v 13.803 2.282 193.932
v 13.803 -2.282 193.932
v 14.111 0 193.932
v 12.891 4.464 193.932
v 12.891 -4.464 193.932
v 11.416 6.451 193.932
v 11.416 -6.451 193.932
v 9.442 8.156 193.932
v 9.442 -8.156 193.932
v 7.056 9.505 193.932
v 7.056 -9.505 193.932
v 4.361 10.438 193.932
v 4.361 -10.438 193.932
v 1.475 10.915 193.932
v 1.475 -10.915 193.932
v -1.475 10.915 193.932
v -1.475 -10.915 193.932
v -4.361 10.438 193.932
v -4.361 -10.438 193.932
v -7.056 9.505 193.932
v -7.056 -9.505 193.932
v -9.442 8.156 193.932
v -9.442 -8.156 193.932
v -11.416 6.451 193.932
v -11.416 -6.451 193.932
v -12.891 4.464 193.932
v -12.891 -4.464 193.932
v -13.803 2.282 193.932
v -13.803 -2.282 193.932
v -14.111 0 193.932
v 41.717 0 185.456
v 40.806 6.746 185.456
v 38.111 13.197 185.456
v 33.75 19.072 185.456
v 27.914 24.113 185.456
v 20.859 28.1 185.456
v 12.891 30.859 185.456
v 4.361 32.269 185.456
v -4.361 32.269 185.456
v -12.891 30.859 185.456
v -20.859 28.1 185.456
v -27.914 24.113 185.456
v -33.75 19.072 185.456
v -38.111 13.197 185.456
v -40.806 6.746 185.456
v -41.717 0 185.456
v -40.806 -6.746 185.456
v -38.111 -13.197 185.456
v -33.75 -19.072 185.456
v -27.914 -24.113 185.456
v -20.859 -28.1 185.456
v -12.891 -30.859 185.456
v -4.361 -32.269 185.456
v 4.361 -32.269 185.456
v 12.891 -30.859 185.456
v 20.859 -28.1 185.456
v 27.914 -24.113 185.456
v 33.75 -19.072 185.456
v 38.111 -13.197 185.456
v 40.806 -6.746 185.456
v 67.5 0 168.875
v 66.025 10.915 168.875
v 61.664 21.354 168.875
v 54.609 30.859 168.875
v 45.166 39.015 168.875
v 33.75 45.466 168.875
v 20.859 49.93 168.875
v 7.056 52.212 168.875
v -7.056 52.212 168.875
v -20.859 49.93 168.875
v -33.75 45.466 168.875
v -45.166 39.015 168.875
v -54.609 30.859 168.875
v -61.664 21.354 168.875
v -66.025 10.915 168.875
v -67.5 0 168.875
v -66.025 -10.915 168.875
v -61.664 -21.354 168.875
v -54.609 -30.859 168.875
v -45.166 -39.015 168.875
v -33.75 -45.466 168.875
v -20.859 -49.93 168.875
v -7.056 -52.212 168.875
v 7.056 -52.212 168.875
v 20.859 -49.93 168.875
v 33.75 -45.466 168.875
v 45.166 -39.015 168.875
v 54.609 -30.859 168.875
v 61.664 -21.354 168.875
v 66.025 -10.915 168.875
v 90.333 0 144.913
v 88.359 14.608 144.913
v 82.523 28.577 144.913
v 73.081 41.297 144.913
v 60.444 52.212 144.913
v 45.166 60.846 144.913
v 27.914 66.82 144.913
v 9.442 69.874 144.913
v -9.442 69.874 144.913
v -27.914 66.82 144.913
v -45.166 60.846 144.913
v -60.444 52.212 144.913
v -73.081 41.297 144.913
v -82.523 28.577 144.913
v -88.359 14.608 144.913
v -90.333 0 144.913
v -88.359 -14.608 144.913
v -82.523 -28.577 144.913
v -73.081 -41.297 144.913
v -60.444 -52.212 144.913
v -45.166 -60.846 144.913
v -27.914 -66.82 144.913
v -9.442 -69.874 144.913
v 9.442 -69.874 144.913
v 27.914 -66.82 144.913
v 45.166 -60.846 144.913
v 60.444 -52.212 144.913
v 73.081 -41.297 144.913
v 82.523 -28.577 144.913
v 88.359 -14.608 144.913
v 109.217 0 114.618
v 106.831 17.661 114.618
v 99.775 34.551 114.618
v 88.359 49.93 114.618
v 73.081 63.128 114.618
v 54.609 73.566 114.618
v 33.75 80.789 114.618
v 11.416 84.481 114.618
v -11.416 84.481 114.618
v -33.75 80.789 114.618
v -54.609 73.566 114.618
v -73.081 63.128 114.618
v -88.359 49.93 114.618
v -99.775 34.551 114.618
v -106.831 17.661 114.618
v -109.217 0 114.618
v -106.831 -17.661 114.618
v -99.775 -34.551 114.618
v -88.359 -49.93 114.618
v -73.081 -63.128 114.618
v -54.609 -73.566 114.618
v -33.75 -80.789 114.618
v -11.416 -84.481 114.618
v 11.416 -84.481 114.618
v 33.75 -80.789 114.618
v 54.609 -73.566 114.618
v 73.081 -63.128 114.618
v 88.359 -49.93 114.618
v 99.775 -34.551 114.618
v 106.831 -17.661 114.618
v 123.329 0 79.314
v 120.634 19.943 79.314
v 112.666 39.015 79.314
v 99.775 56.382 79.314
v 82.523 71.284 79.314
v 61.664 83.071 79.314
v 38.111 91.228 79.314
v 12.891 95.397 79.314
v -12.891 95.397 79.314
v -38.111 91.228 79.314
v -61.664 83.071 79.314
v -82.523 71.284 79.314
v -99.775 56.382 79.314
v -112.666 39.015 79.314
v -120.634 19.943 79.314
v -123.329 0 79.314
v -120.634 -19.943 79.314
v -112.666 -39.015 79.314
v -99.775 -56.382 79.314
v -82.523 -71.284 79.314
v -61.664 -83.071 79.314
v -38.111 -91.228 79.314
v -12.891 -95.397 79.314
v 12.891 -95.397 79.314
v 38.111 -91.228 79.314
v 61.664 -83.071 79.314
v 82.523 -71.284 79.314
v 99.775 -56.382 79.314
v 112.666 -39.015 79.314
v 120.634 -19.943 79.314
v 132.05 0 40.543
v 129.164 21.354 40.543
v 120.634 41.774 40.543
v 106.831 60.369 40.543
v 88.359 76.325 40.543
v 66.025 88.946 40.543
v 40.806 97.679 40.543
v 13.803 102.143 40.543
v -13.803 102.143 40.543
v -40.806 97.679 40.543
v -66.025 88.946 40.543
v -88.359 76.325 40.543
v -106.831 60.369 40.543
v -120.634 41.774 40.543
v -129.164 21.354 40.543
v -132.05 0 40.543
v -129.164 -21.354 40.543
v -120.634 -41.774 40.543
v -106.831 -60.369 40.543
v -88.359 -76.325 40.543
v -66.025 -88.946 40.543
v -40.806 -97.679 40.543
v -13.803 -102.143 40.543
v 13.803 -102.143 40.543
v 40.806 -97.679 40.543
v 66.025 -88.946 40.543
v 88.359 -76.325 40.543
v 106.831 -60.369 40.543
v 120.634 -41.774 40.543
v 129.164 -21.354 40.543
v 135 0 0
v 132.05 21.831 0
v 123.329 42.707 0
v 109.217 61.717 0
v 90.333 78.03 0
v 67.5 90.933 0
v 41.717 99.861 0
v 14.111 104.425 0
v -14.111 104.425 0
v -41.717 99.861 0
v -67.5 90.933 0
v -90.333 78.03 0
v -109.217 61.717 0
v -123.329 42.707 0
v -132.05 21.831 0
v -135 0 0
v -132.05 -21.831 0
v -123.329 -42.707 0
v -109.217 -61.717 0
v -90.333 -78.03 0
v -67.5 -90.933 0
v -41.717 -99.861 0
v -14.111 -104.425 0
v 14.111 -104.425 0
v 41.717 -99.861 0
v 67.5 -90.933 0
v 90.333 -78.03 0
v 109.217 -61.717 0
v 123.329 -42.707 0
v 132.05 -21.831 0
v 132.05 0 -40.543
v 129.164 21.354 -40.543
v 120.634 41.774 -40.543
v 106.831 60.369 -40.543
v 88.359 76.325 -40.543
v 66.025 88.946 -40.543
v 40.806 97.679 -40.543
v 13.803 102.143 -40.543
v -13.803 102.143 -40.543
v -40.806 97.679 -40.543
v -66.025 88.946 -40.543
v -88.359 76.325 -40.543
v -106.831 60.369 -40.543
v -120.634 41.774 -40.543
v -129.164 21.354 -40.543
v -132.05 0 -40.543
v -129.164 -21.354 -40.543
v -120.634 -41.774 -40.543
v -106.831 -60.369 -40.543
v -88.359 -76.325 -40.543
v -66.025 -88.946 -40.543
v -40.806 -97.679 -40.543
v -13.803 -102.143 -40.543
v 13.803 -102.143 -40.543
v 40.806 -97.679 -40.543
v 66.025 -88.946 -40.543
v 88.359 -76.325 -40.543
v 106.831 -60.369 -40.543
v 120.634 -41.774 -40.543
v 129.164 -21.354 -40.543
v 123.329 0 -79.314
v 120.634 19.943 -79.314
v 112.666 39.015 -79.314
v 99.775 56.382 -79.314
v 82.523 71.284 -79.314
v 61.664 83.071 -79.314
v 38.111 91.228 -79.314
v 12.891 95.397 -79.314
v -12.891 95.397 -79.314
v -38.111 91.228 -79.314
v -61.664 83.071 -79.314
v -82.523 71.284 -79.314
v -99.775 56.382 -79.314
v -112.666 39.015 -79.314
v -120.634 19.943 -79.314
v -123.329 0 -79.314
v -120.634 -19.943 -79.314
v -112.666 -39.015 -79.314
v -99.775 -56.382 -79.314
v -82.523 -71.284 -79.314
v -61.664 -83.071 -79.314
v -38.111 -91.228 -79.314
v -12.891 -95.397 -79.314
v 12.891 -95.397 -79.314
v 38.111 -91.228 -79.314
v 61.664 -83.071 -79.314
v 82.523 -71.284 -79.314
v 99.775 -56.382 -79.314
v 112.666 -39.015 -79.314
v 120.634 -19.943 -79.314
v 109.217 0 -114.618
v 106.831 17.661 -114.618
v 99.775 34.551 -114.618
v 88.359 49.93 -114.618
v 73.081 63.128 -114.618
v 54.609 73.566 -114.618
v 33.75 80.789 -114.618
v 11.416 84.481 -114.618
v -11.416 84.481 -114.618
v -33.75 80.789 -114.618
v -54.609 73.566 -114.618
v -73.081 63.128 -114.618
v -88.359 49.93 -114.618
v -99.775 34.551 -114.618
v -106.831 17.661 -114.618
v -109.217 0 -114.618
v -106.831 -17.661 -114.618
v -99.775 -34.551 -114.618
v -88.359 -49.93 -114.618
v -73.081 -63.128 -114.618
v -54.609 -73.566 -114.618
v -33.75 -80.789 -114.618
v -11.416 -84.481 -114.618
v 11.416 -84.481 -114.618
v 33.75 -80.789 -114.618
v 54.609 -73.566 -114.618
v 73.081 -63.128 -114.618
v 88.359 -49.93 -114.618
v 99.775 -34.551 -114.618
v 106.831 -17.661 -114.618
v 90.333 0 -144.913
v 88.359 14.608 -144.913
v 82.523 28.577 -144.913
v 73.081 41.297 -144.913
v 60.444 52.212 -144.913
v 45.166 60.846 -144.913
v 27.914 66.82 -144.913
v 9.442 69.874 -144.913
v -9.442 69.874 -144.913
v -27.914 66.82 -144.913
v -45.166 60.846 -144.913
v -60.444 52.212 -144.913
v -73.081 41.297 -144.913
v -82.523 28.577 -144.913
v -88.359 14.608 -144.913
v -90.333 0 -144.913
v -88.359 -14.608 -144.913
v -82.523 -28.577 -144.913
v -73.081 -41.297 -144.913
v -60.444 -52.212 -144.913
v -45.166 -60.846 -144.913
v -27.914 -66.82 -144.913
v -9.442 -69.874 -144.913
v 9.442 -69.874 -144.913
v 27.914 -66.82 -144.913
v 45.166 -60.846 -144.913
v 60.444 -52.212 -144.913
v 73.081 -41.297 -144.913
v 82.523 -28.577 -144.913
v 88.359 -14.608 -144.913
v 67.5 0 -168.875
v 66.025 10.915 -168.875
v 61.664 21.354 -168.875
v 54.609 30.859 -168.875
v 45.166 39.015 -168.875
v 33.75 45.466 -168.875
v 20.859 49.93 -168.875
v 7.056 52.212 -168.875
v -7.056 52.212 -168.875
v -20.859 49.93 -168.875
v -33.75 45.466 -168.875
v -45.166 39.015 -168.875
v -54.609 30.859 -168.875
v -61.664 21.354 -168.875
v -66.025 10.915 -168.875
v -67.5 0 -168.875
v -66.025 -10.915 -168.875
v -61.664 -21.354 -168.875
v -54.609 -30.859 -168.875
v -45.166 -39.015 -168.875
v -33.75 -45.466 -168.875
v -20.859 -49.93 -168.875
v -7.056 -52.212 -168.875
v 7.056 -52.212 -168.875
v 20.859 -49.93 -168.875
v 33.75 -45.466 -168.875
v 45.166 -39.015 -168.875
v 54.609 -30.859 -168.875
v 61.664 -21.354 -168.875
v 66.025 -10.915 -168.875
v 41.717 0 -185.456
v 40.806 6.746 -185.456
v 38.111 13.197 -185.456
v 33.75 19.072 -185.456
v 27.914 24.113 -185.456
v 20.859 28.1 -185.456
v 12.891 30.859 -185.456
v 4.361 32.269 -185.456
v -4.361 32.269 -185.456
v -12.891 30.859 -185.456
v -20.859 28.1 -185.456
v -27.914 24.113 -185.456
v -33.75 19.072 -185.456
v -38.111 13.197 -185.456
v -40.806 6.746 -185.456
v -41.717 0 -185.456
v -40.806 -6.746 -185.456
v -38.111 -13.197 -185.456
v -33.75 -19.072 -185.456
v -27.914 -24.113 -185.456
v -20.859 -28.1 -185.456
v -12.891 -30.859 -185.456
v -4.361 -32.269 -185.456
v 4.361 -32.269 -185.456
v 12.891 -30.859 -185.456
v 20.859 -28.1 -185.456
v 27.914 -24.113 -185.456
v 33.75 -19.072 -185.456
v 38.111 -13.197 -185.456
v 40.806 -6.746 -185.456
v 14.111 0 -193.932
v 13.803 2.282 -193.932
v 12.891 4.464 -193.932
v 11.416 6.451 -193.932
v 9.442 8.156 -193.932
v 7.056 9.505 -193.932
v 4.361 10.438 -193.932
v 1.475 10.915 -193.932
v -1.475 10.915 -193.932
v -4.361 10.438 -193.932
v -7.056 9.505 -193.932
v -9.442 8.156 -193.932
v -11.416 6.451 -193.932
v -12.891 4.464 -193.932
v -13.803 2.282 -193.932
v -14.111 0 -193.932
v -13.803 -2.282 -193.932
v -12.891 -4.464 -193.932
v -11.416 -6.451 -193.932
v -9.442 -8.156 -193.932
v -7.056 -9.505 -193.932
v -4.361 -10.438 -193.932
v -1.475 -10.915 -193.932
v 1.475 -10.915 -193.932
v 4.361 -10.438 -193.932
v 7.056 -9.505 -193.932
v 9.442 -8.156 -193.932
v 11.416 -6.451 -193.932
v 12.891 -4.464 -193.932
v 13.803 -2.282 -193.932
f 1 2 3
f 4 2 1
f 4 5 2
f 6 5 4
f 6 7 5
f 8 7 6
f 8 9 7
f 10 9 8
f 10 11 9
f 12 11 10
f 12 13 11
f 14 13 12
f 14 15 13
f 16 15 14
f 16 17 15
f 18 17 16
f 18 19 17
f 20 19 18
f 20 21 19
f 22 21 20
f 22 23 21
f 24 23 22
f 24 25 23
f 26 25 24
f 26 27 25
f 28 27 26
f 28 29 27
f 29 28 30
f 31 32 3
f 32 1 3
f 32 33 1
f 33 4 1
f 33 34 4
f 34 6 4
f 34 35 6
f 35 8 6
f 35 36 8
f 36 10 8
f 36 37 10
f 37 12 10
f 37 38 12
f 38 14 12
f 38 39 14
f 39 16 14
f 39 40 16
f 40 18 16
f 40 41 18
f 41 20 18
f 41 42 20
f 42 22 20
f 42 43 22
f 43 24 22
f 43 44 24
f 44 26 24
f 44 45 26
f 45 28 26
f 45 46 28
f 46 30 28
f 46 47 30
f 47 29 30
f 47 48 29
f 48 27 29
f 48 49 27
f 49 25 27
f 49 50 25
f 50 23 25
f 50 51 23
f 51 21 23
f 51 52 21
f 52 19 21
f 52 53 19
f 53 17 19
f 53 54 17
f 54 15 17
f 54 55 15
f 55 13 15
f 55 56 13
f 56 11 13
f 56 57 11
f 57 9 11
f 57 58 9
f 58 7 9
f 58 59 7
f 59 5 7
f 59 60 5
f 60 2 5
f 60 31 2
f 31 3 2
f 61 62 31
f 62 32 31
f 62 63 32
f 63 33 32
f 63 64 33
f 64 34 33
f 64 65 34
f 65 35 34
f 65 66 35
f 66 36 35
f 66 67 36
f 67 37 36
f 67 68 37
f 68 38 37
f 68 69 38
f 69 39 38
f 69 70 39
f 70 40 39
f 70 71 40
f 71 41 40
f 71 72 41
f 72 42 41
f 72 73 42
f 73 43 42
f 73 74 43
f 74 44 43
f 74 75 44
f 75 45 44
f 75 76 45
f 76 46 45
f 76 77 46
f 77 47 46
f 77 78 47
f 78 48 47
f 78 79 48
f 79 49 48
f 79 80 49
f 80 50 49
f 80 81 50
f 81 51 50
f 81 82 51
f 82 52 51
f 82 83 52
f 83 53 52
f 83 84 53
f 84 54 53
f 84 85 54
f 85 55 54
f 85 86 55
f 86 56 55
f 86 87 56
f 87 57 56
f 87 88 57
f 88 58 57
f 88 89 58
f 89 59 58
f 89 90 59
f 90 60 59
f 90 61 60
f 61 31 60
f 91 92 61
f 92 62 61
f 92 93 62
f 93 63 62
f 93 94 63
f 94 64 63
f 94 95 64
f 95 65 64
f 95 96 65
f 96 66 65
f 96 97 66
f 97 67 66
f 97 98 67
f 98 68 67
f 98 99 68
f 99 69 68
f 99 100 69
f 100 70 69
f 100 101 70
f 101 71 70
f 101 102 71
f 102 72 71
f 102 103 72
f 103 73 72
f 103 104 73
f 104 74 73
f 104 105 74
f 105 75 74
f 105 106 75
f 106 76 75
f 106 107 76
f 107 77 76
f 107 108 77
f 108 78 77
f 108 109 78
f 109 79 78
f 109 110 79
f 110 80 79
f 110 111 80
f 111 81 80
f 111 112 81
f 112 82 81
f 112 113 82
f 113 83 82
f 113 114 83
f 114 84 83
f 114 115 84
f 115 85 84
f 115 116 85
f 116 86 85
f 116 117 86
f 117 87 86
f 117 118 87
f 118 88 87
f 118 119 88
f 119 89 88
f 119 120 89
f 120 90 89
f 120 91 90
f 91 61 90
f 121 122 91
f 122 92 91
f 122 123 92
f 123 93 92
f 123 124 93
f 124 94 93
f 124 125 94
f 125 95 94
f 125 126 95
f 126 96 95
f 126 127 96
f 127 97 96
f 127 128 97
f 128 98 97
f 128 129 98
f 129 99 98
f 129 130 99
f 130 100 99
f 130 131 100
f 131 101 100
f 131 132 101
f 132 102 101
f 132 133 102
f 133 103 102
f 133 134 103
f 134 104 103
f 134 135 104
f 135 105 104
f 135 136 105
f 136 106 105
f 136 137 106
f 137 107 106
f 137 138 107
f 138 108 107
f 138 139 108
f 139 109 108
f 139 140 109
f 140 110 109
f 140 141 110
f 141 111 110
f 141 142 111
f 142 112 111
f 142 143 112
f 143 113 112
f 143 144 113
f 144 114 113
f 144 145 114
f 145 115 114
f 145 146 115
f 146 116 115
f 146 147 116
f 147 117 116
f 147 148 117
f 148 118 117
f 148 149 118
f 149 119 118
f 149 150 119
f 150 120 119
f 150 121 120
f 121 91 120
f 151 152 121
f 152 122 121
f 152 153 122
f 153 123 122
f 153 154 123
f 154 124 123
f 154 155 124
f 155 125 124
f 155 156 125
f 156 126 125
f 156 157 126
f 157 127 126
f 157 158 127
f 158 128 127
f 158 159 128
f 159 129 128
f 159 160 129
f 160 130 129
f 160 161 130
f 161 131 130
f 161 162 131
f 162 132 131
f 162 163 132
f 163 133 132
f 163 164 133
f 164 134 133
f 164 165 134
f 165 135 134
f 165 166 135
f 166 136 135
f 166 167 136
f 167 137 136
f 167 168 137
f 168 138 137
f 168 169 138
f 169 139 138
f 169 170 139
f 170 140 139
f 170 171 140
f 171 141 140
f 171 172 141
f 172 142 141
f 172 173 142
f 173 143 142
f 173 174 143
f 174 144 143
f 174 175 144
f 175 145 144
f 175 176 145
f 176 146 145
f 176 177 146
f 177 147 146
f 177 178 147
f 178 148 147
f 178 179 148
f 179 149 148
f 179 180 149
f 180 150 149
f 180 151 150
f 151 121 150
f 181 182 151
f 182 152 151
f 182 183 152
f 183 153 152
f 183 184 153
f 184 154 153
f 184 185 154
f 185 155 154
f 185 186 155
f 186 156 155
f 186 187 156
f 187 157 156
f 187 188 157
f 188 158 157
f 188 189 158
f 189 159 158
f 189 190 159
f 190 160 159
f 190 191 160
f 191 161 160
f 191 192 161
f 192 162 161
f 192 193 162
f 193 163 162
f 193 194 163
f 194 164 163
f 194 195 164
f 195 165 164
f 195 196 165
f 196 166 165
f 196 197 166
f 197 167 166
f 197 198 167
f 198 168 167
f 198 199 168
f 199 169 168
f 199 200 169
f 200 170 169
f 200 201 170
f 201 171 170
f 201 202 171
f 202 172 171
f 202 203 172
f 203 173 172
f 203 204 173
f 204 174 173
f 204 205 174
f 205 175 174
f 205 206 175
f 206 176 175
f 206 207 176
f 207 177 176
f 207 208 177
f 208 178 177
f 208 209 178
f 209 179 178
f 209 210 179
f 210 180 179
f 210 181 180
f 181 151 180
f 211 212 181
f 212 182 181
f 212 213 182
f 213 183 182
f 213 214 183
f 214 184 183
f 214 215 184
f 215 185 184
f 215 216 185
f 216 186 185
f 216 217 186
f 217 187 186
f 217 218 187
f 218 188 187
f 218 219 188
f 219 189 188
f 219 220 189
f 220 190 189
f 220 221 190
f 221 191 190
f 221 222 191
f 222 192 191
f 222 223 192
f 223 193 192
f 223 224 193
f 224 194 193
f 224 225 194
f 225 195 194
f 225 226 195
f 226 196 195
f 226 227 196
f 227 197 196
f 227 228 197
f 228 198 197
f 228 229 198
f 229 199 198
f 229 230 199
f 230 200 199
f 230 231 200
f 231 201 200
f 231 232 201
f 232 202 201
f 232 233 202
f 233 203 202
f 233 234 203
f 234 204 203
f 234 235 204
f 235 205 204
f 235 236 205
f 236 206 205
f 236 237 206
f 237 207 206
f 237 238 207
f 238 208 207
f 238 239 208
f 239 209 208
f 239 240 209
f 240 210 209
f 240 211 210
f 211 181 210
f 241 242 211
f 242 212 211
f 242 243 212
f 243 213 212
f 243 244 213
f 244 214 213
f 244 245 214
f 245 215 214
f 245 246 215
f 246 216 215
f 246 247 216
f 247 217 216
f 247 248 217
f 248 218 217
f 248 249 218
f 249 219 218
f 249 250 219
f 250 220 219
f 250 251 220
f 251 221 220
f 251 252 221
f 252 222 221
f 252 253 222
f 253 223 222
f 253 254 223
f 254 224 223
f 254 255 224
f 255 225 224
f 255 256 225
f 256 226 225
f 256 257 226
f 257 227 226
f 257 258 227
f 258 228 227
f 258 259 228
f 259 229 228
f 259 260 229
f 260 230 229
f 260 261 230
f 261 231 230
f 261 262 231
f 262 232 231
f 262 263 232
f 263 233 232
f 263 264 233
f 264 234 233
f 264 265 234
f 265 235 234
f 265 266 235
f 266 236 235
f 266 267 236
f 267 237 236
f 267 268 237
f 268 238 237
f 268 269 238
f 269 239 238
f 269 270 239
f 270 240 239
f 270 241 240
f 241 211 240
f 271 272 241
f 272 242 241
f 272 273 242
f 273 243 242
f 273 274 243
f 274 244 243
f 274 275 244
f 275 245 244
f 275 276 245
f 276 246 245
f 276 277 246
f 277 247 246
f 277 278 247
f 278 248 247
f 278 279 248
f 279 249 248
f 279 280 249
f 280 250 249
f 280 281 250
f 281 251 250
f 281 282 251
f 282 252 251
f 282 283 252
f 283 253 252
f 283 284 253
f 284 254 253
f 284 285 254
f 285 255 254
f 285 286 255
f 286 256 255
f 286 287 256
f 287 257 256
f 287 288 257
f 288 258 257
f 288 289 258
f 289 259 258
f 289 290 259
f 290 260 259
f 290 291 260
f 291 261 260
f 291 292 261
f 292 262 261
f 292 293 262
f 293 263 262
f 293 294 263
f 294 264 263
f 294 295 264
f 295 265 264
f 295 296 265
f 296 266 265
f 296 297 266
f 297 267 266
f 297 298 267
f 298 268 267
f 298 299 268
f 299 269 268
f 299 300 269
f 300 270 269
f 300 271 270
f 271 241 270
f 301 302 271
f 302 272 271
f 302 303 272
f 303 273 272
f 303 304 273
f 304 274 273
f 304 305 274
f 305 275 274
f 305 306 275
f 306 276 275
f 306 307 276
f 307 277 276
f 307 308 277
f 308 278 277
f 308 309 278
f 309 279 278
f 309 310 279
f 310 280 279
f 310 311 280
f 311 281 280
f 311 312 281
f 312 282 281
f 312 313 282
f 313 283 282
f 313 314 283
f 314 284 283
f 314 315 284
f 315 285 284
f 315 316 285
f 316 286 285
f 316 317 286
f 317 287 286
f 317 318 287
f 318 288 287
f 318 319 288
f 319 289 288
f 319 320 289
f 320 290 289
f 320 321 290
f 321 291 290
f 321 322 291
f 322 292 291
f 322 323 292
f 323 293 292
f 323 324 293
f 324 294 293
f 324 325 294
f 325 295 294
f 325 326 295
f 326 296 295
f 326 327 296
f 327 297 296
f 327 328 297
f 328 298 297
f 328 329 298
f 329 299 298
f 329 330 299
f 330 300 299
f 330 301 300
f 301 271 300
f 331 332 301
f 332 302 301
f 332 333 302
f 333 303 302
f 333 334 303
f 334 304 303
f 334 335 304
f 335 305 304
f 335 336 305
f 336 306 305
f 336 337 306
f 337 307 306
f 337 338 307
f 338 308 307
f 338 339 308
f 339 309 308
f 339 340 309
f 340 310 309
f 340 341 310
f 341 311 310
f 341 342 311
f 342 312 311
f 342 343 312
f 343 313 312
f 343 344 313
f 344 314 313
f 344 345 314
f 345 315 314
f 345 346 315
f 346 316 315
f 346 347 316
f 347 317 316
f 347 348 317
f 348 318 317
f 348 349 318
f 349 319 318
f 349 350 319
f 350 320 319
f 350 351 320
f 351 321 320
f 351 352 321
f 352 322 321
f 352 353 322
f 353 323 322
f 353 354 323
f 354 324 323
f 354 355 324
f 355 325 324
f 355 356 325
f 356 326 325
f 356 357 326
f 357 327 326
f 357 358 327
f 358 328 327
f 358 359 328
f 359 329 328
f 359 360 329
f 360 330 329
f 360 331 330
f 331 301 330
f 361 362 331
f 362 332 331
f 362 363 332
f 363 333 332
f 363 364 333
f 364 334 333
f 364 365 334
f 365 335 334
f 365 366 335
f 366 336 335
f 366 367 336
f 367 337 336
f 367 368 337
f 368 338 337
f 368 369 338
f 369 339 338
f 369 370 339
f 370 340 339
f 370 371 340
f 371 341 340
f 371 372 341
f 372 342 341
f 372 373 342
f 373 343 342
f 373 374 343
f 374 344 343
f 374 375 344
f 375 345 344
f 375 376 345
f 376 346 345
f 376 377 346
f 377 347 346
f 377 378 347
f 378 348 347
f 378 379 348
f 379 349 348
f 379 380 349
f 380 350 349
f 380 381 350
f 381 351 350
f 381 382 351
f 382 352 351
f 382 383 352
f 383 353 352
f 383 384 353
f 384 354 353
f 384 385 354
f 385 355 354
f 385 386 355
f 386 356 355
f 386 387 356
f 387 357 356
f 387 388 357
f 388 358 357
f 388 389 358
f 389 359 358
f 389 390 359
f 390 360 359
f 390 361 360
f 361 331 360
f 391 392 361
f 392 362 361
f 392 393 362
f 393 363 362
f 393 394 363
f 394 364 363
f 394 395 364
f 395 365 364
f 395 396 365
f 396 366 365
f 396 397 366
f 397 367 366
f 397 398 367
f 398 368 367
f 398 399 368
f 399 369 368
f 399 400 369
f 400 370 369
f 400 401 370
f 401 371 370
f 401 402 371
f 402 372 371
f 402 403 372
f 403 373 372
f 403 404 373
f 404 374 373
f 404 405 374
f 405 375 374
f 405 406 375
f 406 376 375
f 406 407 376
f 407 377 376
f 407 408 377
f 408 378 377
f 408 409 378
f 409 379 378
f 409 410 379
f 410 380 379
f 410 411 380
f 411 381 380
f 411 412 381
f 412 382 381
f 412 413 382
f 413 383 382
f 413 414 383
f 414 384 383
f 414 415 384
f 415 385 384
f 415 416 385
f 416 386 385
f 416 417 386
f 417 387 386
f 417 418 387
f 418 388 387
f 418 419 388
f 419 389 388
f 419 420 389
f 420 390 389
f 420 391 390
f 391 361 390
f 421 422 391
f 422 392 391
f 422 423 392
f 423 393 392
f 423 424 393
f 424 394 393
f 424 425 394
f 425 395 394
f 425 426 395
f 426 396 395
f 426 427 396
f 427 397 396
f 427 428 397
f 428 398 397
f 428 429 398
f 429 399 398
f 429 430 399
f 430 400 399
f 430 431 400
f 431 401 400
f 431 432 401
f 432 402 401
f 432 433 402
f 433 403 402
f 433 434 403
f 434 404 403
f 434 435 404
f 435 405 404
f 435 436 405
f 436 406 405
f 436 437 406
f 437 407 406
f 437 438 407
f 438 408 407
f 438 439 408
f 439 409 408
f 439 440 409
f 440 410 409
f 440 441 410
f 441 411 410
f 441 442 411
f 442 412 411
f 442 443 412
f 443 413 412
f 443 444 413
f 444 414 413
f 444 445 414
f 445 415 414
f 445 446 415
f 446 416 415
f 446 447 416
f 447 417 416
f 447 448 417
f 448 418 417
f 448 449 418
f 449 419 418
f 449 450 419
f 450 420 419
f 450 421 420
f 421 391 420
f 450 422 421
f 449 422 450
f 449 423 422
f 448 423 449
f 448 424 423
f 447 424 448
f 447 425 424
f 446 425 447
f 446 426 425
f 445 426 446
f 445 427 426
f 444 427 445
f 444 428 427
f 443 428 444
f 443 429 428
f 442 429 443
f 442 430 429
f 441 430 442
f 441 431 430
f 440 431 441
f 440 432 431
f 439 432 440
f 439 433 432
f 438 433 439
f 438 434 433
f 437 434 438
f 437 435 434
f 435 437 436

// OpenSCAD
// Generated by SolidPython 1.0.1 on 2020-07-29 00:46:48


scale(v = [9, 7, 13]) {
	sphere(r = 15);
}
/***********************************************
*********      SolidPython code:      **********
************************************************
 
# import packages: SolidPython
from solid import *
from solid.utils import *
from itertools import chain, combinations, permutations


class Resize:

    def __init__(self, scad_file):
        self.scad_file = scad_file
        #self.scad_file = import_scad(scad_file)
        # cone/cylinder param:
        self.r1 = 0
        self.r2 = 0
        self.h = 0
        # rectangular prism param:
        self.w = 0
        self.l = 0
        # ellipse param:
        self.r = 0

    # import OpenScad code (file name corresponds to shape)


    # classify shape + parameters
    def assign(self, param1, param2, param3):
        if self.scad_file == 'cone.scad':
            self.r1 = param1
            self.r2 = param2
            self.h = param3
        elif self.scad_file == 'cylinder.scad':
            self.r1 = param1
            self.r2 = param2
            self.h = param3
        elif self.scad_file == 'rectangularPrism.scad':
            self.h = param1
            self.l = param2
            self.w = param3
        else:
            self.r = param1
            self.h = param2

    # resize parameters
    def iterate(self):
        x = range(3, 20, 2)
        i = 1
        if self.scad_file == 'cone.scad':
            tempList = list(permutations(x, 2))
            for temp in tempList:
                param1 = temp[0]
                param2 = temp[1]
                filepath = 'produced_scad_files/' + 'cone' + str(param1) + '_' + str(param2) + '_' + '.scad'
                scad_render_to_file(cylinder(h=param1, r1=param2, r2=0), filepath)

        elif self.scad_file == 'cylinder.scad':
            tempList = list(permutations(x, 3))
            for temp in tempList:
                param1 = temp[0]
                param2 = temp[1]
                filepath = 'produced_scad_files/' + 'cylinder' + str(param1) + '_' + str(param2) + '_' + '.scad'
                scad_render_to_file(cylinder(h=param1, r1=param2, r2=param2), filepath)

        elif self.scad_file == 'rectangularPrism.scad':
            tempList = list(permutations(x, 3))
            for temp in tempList:
                param1 = temp[0]
                param2 = temp[1]
                param3 = temp[2]
                filepath = 'produced_scad_files/' + 'rectangularPrism' + str(param1) + '_' + str(param2) + '_' + str(
                    param3) + '.scad'
                scad_render_to_file(cube(size=(param1, param2, param3)), filepath)

        elif self.scad_file == 'ellipse.scad':
            tempList = list(permutations(x, 4))
            for temp in tempList:
                param1 = temp[0]
                param2 = temp[1]
                param3 = temp[2]
                param4 = temp[3]
                filepath = 'produced_scad_files/' + 'ellipse' + str(param1) + '_' + str(param2) + '_' + str(param3) + '_' + str(param4) + '.scad'
                scad_render_to_file(scale([param1, param2, param3])(sphere(r=param4)), filepath)

    def render_to_scadfile(self):
        scad_render_to_file(scad, 'example.scad') 
 
************************************************/
